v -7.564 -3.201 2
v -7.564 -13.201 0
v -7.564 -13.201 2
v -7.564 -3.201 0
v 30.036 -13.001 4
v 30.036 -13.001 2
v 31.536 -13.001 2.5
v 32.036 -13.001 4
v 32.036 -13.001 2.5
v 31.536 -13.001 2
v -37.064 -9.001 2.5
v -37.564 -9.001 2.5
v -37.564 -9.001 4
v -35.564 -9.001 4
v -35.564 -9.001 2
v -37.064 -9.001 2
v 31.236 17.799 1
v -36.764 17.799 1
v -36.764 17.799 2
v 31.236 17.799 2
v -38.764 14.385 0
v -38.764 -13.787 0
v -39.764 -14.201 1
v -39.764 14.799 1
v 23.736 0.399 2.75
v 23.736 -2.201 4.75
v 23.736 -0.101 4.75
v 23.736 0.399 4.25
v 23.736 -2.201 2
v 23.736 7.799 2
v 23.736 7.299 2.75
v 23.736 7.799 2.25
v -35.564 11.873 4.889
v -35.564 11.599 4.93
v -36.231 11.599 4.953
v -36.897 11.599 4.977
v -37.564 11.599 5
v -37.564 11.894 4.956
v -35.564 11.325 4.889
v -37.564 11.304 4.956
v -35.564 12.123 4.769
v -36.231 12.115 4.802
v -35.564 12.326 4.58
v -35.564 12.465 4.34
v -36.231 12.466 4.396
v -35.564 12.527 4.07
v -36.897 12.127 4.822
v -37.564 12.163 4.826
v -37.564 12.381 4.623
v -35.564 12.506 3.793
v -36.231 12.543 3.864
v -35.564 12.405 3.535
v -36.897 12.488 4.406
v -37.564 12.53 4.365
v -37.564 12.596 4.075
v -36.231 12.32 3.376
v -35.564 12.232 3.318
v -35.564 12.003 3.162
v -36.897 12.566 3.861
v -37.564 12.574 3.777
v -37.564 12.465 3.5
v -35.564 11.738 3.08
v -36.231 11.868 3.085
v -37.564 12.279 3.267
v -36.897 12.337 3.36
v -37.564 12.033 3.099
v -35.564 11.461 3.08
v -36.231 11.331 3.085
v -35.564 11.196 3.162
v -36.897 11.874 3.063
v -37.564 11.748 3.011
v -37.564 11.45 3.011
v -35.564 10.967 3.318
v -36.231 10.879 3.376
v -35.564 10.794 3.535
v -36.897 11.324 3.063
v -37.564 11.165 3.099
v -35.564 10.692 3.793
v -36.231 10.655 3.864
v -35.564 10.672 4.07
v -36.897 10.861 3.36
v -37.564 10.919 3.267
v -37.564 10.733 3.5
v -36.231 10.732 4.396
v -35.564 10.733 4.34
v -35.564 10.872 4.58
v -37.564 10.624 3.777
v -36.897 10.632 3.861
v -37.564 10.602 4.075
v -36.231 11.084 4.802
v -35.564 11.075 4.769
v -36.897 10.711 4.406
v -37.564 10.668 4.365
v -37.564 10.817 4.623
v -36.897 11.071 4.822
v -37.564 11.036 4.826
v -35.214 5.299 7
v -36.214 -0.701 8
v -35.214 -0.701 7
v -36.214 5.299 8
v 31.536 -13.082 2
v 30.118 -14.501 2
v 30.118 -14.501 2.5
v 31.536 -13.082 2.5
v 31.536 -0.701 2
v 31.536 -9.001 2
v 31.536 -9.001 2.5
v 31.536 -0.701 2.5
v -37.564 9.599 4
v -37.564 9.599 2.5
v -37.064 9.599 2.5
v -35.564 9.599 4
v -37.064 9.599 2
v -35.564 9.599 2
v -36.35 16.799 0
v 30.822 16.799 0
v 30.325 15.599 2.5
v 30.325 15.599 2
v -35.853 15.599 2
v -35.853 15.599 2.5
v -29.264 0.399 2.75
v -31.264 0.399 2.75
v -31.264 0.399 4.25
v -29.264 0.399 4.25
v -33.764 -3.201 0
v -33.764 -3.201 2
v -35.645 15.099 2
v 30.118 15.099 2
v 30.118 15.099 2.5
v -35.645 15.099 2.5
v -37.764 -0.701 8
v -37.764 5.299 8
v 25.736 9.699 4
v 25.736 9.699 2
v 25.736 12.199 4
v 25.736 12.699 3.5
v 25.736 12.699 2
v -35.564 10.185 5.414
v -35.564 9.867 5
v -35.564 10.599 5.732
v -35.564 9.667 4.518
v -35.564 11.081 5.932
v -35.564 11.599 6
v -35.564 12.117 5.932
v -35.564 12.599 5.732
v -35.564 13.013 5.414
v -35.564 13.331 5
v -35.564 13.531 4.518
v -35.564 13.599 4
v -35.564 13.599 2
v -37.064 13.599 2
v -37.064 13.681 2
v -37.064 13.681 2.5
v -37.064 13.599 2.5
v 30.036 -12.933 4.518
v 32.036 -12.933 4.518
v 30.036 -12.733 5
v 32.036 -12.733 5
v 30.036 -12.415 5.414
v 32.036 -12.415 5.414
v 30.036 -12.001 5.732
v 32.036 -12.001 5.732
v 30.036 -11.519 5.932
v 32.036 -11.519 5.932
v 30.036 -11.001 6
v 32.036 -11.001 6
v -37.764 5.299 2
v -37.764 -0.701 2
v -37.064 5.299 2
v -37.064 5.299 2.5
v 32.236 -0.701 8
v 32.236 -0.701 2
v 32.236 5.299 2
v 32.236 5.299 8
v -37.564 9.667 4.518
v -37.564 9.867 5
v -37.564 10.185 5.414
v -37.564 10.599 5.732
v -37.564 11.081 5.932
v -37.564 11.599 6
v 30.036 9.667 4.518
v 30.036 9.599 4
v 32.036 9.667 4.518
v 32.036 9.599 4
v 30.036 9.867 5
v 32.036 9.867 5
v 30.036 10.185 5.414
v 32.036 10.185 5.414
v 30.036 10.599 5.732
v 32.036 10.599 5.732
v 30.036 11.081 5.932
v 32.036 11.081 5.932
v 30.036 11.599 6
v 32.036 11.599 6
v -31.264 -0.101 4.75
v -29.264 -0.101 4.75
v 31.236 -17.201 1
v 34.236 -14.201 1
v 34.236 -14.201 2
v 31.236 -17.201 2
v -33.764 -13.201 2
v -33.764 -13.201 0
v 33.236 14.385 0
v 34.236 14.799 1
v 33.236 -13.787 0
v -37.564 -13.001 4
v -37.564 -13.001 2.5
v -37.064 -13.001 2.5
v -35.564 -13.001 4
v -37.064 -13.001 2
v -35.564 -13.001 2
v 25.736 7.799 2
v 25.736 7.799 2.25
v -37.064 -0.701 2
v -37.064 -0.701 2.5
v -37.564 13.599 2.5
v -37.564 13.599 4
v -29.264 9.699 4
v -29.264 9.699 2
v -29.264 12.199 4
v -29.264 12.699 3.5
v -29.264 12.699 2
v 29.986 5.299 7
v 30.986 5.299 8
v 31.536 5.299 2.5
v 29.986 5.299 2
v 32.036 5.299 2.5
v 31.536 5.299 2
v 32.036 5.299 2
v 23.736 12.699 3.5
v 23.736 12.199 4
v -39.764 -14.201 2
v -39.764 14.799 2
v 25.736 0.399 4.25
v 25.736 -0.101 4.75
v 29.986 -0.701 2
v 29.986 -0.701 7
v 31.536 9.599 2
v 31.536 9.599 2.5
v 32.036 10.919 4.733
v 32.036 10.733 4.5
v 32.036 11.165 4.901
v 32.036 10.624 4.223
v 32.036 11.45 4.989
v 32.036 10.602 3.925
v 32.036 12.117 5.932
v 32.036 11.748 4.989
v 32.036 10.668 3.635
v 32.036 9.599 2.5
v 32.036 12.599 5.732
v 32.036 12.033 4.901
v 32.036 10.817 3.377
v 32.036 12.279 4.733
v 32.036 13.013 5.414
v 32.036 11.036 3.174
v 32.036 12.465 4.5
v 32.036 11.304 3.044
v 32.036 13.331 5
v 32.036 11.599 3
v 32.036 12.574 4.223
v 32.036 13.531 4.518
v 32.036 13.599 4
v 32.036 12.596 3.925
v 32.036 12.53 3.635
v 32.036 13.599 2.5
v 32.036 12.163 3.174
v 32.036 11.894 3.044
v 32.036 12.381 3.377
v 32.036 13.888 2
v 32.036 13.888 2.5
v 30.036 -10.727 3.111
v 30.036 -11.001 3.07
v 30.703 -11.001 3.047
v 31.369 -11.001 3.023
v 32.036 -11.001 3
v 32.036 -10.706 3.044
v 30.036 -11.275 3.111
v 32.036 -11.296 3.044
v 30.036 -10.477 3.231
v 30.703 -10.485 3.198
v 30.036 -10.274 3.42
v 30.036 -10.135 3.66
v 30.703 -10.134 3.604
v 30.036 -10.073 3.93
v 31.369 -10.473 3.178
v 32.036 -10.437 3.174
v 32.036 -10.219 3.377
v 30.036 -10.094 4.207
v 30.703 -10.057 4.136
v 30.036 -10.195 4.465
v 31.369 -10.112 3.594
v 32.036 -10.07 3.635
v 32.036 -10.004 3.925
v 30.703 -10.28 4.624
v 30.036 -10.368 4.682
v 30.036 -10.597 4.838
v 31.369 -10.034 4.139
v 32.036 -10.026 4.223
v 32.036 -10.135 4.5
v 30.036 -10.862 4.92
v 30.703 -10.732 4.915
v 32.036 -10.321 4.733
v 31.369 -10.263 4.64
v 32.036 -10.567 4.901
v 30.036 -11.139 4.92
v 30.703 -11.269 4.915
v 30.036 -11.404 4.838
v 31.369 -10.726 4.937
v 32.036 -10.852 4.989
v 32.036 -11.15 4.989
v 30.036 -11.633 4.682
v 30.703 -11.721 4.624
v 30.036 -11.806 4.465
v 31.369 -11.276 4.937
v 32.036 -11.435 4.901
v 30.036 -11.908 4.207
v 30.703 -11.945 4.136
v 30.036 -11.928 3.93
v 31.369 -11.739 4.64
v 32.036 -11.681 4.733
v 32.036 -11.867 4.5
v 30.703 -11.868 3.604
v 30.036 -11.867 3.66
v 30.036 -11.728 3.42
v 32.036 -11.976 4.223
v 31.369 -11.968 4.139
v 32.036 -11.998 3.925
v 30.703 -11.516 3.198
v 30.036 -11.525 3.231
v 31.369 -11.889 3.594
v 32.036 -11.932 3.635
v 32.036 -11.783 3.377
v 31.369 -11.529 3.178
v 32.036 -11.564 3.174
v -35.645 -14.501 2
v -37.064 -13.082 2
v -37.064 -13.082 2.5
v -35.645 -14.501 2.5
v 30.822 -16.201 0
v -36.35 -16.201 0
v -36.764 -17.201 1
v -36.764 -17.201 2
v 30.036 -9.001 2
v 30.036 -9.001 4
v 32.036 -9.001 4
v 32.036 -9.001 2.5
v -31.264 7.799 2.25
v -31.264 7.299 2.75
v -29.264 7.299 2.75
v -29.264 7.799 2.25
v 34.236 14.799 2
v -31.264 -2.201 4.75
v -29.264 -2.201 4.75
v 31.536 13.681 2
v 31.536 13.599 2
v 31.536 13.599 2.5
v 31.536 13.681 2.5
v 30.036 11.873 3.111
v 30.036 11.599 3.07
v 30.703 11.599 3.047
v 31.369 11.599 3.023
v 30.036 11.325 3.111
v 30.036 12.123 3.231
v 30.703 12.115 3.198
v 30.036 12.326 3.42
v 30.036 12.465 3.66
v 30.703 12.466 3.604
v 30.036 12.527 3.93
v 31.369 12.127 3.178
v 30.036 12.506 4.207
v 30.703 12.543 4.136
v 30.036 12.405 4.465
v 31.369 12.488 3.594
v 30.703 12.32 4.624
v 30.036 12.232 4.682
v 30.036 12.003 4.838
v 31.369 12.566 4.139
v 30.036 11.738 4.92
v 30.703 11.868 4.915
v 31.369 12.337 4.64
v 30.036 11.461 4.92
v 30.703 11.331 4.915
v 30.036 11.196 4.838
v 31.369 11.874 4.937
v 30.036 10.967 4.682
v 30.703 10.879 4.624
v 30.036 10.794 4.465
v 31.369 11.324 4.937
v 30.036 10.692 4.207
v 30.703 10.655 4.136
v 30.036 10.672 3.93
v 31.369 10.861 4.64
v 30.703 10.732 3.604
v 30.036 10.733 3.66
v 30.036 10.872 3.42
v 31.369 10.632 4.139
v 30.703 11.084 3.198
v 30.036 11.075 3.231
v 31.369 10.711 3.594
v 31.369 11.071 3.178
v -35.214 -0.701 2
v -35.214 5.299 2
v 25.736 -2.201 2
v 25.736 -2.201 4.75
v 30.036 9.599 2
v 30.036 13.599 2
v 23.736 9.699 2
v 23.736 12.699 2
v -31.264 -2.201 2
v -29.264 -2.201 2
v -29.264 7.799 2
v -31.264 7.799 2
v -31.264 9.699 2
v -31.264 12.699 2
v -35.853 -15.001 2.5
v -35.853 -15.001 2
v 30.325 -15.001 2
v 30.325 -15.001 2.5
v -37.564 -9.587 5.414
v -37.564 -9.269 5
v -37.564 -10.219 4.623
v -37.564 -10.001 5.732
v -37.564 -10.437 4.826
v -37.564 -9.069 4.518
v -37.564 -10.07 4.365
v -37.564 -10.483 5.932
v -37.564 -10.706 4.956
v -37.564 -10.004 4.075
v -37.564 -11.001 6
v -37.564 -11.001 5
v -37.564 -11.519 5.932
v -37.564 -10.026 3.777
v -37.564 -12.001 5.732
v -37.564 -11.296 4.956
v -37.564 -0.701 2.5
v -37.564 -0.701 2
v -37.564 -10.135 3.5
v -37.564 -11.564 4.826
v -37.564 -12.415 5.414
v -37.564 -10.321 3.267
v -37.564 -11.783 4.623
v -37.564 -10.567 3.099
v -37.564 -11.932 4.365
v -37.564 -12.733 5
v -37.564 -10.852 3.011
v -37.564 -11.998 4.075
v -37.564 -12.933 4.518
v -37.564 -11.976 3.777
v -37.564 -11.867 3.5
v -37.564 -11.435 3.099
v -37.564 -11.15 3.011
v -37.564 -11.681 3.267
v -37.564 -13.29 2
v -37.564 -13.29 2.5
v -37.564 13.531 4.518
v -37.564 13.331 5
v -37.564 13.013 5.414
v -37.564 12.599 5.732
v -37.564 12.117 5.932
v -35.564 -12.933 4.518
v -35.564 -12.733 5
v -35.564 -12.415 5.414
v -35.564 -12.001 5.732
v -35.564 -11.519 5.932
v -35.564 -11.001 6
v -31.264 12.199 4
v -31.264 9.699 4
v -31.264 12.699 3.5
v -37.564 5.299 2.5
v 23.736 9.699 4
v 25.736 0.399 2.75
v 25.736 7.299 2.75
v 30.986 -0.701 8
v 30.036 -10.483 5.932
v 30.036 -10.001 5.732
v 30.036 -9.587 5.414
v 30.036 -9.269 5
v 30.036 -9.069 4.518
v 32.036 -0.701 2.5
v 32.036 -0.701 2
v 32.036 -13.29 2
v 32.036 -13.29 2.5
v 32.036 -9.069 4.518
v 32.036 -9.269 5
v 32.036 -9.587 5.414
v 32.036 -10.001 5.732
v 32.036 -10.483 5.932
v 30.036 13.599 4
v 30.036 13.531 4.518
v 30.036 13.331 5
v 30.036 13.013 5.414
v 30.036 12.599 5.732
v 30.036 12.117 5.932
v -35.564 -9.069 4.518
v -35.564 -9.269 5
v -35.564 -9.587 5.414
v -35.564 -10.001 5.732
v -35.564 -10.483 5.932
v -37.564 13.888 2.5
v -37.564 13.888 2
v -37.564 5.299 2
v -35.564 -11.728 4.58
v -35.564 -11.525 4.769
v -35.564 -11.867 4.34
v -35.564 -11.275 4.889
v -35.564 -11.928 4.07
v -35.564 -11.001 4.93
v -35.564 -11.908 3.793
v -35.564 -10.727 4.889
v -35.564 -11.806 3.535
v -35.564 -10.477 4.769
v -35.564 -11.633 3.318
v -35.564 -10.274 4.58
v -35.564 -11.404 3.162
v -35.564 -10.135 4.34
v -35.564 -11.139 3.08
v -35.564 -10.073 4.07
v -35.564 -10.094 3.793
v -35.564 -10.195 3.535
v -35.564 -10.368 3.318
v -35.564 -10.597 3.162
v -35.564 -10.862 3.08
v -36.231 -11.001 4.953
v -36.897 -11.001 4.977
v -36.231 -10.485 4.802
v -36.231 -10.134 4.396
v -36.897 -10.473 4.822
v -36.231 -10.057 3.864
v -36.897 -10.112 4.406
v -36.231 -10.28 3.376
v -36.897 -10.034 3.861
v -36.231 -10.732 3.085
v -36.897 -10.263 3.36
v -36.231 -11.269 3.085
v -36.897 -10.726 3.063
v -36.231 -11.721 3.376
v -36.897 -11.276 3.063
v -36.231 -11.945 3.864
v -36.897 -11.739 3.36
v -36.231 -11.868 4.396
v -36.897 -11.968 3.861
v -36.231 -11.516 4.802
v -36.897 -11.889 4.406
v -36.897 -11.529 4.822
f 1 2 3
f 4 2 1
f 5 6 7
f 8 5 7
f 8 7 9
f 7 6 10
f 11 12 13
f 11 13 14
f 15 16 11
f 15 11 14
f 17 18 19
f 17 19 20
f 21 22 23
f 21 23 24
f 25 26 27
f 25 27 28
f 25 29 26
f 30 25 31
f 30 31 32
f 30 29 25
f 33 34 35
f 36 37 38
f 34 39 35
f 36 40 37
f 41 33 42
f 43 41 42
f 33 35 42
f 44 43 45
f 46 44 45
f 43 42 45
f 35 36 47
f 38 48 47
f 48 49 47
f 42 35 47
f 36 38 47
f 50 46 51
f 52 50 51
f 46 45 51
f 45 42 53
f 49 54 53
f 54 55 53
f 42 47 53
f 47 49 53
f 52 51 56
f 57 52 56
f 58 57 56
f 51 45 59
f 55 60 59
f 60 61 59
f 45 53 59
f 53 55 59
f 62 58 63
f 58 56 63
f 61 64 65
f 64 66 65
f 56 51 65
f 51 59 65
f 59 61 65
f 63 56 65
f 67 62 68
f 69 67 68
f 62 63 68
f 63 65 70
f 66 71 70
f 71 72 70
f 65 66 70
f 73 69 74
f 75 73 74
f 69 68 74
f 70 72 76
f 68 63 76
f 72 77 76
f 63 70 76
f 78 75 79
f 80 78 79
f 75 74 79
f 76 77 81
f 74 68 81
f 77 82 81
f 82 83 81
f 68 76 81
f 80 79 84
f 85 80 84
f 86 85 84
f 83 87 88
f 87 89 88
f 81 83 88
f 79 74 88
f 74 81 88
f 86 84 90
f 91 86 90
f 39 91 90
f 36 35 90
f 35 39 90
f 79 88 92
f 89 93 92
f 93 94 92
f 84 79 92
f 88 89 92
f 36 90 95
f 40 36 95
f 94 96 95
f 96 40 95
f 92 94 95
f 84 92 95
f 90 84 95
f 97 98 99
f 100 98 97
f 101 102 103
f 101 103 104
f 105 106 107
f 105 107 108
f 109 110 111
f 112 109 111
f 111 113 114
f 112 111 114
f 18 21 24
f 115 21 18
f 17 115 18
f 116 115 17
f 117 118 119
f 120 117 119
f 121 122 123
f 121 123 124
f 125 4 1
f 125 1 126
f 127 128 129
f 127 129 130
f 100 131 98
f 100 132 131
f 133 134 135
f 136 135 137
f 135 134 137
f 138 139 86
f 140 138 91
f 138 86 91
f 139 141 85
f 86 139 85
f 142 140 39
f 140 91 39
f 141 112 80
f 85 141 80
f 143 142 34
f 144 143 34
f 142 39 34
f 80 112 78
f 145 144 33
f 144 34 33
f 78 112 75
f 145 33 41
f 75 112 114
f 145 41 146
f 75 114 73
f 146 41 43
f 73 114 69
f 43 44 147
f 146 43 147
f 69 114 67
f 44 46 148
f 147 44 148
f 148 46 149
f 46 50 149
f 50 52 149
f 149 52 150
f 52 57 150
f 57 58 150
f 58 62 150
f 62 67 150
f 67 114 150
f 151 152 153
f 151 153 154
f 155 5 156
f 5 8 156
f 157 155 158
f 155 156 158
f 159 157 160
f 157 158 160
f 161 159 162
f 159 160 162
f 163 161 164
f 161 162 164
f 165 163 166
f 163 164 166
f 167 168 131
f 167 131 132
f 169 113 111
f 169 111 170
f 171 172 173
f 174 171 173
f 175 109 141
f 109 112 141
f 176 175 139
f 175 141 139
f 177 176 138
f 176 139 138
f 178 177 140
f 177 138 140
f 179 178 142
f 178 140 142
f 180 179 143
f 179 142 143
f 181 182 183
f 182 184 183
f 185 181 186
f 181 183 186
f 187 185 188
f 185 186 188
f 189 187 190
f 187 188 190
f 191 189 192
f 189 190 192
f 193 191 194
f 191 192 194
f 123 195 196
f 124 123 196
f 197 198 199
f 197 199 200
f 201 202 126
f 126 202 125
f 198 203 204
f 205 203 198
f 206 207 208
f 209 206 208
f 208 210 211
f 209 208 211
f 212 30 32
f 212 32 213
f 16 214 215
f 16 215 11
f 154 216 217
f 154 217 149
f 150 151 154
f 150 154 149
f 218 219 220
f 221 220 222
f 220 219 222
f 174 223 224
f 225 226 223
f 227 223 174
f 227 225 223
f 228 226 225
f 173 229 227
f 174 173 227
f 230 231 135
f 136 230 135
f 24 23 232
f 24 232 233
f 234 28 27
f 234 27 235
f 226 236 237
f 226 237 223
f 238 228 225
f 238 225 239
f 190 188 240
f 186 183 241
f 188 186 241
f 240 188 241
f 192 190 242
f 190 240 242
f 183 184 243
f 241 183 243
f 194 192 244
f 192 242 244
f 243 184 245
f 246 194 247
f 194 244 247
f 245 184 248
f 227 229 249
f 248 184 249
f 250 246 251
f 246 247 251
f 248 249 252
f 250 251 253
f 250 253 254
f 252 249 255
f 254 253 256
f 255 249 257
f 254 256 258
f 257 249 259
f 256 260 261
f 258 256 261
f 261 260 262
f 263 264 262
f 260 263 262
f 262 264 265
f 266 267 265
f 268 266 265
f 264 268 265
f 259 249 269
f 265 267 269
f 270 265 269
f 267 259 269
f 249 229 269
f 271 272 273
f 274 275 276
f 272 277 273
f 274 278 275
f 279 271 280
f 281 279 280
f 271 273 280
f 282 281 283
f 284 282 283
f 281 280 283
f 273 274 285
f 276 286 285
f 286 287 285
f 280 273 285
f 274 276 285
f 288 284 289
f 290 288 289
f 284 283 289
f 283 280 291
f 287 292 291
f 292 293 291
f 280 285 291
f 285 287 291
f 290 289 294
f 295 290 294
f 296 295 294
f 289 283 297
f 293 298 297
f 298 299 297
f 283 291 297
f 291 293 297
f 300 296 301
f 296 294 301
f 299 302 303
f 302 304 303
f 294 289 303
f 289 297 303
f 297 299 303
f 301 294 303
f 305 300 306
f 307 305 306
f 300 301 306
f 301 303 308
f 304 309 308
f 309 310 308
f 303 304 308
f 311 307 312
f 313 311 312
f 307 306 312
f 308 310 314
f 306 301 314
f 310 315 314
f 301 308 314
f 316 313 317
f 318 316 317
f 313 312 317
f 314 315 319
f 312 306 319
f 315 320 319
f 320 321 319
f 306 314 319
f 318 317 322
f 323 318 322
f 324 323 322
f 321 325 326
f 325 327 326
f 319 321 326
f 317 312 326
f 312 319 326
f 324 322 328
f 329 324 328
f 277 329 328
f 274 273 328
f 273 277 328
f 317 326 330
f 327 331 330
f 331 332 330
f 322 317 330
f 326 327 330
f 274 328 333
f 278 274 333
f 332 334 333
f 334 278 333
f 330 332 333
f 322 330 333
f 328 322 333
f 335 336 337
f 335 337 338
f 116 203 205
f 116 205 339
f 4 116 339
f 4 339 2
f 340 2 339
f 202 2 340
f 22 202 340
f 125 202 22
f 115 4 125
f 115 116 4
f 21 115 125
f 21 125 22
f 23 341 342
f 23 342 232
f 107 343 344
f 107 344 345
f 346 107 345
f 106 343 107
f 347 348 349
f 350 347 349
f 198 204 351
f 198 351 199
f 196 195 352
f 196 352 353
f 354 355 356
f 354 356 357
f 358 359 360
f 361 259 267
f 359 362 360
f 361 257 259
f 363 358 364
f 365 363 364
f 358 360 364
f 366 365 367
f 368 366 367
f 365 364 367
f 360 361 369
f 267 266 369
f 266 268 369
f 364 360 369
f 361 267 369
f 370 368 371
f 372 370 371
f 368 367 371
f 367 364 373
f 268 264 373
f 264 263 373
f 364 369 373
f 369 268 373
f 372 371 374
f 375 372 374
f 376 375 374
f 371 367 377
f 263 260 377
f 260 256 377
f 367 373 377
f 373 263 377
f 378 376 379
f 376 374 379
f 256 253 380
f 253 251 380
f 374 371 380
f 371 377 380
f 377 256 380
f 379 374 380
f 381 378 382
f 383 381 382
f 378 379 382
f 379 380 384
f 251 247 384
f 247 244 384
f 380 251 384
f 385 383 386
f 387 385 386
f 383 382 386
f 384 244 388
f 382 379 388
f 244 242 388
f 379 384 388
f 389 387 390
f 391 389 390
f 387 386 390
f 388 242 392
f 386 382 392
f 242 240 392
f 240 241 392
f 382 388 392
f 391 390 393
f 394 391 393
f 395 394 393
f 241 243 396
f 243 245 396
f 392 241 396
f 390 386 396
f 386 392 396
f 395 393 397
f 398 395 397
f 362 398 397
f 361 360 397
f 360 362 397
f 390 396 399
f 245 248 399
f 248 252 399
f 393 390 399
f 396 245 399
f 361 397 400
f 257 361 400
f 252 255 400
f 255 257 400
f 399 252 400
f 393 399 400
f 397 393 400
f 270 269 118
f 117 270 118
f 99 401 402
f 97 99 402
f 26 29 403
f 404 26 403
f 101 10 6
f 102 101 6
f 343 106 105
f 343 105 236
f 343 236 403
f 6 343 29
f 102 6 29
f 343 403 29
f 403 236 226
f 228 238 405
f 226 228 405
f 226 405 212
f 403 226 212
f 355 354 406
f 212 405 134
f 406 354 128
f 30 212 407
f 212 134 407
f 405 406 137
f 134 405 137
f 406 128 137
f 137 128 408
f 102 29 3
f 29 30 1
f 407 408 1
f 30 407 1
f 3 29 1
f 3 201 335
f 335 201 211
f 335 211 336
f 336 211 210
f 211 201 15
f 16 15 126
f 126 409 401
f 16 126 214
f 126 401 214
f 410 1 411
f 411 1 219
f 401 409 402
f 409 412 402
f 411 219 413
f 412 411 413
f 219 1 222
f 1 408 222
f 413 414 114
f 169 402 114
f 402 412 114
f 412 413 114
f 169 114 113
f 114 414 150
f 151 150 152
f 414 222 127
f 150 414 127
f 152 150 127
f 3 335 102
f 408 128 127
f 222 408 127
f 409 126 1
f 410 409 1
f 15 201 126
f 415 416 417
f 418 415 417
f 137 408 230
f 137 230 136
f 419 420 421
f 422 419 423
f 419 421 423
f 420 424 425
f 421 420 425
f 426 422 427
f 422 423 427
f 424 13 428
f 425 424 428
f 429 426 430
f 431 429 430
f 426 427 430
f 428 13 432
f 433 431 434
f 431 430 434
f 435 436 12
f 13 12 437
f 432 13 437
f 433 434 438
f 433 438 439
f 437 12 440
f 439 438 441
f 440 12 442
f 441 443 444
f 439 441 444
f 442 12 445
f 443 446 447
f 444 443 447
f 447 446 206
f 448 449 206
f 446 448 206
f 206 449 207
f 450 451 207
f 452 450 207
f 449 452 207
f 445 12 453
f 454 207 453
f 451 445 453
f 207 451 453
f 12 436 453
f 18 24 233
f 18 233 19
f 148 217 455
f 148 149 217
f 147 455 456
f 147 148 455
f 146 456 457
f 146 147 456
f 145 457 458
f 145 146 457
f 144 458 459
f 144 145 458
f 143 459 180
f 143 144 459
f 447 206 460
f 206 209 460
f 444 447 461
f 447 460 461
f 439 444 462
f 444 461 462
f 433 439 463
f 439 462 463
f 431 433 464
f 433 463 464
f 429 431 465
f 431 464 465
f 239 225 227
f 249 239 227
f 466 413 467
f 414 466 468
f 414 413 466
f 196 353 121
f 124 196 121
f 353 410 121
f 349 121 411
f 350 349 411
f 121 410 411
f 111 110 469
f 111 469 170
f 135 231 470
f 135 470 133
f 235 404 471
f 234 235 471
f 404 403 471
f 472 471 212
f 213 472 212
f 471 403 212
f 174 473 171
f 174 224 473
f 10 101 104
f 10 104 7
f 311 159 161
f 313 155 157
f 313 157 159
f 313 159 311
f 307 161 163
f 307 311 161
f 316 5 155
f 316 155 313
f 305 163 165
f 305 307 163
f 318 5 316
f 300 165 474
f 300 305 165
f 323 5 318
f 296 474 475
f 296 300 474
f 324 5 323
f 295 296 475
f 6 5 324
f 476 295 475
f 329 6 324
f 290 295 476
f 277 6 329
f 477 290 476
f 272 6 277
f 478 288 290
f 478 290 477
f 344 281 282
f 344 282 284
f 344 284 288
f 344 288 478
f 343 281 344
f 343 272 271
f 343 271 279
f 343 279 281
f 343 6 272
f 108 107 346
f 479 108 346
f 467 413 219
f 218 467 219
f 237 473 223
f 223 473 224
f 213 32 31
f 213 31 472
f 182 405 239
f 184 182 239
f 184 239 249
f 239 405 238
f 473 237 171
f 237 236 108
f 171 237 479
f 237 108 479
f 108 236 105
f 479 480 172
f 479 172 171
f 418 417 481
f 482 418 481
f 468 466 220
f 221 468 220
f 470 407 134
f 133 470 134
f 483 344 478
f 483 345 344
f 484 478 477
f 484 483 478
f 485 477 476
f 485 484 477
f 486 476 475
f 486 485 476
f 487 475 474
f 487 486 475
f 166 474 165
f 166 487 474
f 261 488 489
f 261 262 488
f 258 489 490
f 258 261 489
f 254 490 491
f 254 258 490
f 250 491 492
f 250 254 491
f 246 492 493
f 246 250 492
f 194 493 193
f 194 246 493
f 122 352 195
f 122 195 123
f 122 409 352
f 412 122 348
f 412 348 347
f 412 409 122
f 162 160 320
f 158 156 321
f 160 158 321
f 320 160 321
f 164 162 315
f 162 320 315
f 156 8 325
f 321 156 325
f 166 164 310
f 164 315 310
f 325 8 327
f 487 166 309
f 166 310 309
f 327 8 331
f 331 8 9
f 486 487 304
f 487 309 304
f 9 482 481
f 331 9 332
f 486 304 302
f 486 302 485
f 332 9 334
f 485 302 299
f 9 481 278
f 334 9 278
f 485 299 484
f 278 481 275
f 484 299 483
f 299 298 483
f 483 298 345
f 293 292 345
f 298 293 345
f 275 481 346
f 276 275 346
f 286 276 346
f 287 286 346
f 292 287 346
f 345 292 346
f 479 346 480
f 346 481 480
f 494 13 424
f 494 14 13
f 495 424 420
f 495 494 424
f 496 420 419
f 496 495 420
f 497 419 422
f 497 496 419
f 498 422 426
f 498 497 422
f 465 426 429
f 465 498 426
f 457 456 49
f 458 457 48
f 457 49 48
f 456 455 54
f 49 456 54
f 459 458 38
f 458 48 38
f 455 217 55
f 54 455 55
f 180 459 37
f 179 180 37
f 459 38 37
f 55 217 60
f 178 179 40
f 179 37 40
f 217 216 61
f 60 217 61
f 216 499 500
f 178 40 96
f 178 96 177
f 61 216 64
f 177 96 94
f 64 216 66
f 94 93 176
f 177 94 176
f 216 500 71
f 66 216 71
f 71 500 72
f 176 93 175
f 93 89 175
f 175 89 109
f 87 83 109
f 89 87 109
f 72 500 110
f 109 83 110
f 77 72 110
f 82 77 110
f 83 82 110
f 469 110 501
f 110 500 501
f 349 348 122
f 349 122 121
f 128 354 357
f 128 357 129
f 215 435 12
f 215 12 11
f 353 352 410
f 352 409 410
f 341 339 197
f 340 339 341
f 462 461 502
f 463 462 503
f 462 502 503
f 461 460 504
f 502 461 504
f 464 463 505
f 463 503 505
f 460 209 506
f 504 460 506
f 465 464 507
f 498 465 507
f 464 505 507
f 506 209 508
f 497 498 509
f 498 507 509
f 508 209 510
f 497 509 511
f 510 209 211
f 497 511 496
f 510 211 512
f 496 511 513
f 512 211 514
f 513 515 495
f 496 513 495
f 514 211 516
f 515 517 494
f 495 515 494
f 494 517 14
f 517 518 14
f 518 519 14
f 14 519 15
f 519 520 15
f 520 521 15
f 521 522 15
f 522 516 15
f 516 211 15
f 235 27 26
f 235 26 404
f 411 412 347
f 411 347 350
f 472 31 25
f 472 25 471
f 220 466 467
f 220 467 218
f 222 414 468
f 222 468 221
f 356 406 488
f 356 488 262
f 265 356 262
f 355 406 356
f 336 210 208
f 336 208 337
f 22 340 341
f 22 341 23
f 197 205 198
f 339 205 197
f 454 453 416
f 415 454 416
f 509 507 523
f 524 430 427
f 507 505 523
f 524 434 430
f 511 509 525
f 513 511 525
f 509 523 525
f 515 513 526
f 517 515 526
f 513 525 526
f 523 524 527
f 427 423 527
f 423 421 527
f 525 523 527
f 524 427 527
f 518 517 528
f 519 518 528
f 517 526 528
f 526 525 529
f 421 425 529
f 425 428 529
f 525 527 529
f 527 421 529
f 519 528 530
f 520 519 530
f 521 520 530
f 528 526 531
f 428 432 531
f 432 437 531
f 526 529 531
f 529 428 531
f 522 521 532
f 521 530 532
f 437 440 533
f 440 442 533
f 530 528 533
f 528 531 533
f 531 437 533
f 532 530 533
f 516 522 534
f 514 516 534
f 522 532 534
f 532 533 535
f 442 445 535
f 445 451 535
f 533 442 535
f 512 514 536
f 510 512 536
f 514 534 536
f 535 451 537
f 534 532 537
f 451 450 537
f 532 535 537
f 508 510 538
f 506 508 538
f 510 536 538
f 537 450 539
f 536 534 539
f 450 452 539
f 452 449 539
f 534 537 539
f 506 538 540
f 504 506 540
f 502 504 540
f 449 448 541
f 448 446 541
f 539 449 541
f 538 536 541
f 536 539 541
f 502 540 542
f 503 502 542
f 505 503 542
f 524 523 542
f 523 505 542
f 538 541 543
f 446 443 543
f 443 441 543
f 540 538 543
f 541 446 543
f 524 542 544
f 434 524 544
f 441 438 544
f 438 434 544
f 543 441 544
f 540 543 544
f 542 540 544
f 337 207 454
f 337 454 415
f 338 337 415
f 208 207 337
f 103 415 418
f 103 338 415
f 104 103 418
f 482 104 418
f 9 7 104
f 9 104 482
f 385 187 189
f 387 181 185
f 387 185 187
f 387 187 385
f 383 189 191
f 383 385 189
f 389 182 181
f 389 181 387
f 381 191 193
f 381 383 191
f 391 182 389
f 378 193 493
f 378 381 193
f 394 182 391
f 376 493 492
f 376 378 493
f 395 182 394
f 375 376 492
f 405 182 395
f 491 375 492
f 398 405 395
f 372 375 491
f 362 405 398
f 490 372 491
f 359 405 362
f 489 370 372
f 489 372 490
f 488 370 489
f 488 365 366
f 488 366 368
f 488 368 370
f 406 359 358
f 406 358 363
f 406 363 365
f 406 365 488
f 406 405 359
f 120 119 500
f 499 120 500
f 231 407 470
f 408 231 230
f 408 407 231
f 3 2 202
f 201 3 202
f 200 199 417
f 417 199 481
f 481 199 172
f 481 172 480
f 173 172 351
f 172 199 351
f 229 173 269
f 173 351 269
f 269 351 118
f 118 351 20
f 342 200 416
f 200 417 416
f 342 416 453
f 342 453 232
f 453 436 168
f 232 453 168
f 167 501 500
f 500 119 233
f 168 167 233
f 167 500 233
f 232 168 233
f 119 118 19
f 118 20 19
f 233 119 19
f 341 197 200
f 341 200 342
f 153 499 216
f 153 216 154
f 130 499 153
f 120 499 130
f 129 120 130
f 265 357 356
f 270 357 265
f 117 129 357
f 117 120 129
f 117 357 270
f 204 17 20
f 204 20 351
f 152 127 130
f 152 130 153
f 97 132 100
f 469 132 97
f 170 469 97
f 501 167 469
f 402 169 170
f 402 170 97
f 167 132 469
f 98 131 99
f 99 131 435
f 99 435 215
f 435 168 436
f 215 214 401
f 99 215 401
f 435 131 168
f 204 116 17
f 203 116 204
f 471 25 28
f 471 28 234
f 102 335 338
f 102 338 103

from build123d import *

# Parameters (mm, degrees)
EXTRUDE_1_DEPTH               = 2
CHAMFER_1_SIZE                = 1
SKETCH_3_W                    = 2
SKETCH_3_H                    = 4
EXTRUDE_2_DEPTH               = 4
FILLET_1_R                    = 2
SKETCH_4_R                    = 1
CUT_EXTRUDE_1_DEPTH           = 2
CUT_EXTRUDE_1_DRAFT           = -2
CUT_EXTRUDE_1_PROFILE_2_DEPTH = 2
CUT_EXTRUDE_1_PROFILE_2_DRAFT = -2
SKETCH_5_R                    = 1
CUT_EXTRUDE_2_DEPTH           = 2
CUT_EXTRUDE_2_DRAFT           = -2
CUT_EXTRUDE_2_PROFILE_2_DEPTH = 2
CUT_EXTRUDE_2_PROFILE_2_DRAFT = -2
SKETCH_6_W                    = 2
SKETCH_6_H                    = 10
EXTRUDE_3_DEPTH               = 0.75
SKETCH_7_W                    = 2
SKETCH_7_H                    = 2.6
EXTRUDE_4_DEPTH               = 2
CHAMFER_2_SIZE                = 0.5
SKETCH_8_W                    = 2.55
SKETCH_8_H                    = 6
SKETCH_8_W_2                  = 2.25
EXTRUDE_5_DEPTH               = 6
CHAMFER_3_SIZE                = 1
SKETCH_9_W                    = 2
SKETCH_9_H                    = 3
EXTRUDE_6_DEPTH               = 2
CHAMFER_4_SIZE                = 0.5
CUT_EXTRUDE_3_REACH           = 46.294
SKETCH_10_W                   = 26.2
SKETCH_10_H                   = 10
EXTRUDE_7_DEPTH               = 0.5


with BuildPart() as part:
    # 草图1 → 凸台-拉伸1 (new body)
    with BuildSketch(Plane.XY):
        Polygon((-39.76383505, 14.799206062), (-36.76383505, 17.799206062), (31.23616495, 17.799206062), (34.23616495, 14.799206062), (34.23616495, -14.200793938), (31.23616495, -17.200793938), (-36.76383505, -17.200793938), (-39.76383505, -14.200793938), align=None)
    extrude(amount=EXTRUDE_1_DEPTH)

    # 倒角1
    chamfer_1_edges = [part.edges().sort_by_distance(p)[0] for p in [
        (-38.26383505, -15.700793938, 0),
        (-39.76383505, 0.299206062, 0),
        (-38.26383505, 16.299206062, 0),
        (-2.76383505, 17.799206062, 0),
        (32.73616495, 16.299206062, 0),
        (34.23616495, 0.299206062, 0),
        (32.73616495, -15.700793938, 0),
        (-2.76383505, -17.200793938, 0),
    ]]
    chamfer(chamfer_1_edges, length=CHAMFER_1_SIZE)

    # 草图3 → 凸台-拉伸2 (add)
    with BuildSketch(Plane.XY.offset(2)):
        with Locations((-36.56383505, 11.599206062)):
            Rectangle(SKETCH_3_W, SKETCH_3_H)
        with Locations((-36.56383505, -11.000793938)):
            Rectangle(SKETCH_3_W, SKETCH_3_H)
        with Locations((31.03616495, 11.599206062)):
            Rectangle(SKETCH_3_W, SKETCH_3_H)
        with Locations((31.03616495, -11.000793938)):
            Rectangle(SKETCH_3_W, SKETCH_3_H)
    extrude(amount=EXTRUDE_2_DEPTH)

    # 圆角1
    fillet_1_edges = [part.edges().sort_by_distance(p)[0] for p in [
        (31.03616495, 13.599206062, 6),
        (31.03616495, 9.599206062, 6),
        (31.03616495, -9.000793938, 6),
        (31.03616495, -13.000793938, 6),
        (-36.56383505, -13.000793938, 6),
        (-36.56383505, -9.000793938, 6),
        (-36.56383505, 13.599206062, 6),
        (-36.56383505, 9.599206062, 6),
    ]]
    fillet(fillet_1_edges, radius=FILLET_1_R - 0.0001)  # a hair under: the kernel refuses the full size


with BuildPart() as cut_extrude_1_tool:
    # 草图4 → 切除-拉伸1 (with draft: the straight prism first)
    with BuildSketch(Plane(origin=(32.03616495, 0, 0), x_dir=(0, 0, -1), z_dir=(1, 0, 0))):
        with Locations((-4, 11.599206062)):
            Circle(SKETCH_4_R)
    extrude(amount=-CUT_EXTRUDE_1_DEPTH)
    # 切除-拉伸1: the draft: its side faces are tilted about the plane it starts from
    cut_extrude_1_sides = [cut_extrude_1_tool.faces().sort_by_distance(p)[0] for p in [
        (31.03616495, 11.599206062, 5),
    ]]
    draft(cut_extrude_1_sides, Plane(origin=(32.03616495, 0, 0), x_dir=(0, 0, -1), z_dir=(1, 0, 0)), CUT_EXTRUDE_1_DRAFT)


with BuildPart() as part_1:
    add(part.part)

    # 切除-拉伸1: cut by cut_extrude_1_tool
    add(cut_extrude_1_tool.part, mode=Mode.SUBTRACT)


with BuildPart() as cut_extrude_1_profile_2_tool:
    # 草图4 → 切除-拉伸1 profile 2 (with draft: the straight prism first)
    with BuildSketch(Plane(origin=(32.03616495, 0, 0), x_dir=(0, 0, -1), z_dir=(1, 0, 0))):
        with Locations((-4, -11.000793938)):
            Circle(SKETCH_4_R)
    extrude(amount=-CUT_EXTRUDE_1_PROFILE_2_DEPTH)
    # 切除-拉伸1 profile 2: the draft: its side faces are tilted about the plane it starts from
    cut_extrude_1_profile_2_sides = [cut_extrude_1_profile_2_tool.faces().sort_by_distance(p)[0] for p in [
        (31.03616495, -11.000793938, 5),
    ]]
    draft(cut_extrude_1_profile_2_sides, Plane(origin=(32.03616495, 0, 0), x_dir=(0, 0, -1), z_dir=(1, 0, 0)), CUT_EXTRUDE_1_PROFILE_2_DRAFT)


with BuildPart() as part_2:
    add(part_1.part)

    # 切除-拉伸1 profile 2: cut by cut_extrude_1_profile_2_tool
    add(cut_extrude_1_profile_2_tool.part, mode=Mode.SUBTRACT)


with BuildPart() as cut_extrude_2_tool:
    # 草图5 → 切除-拉伸2 (with draft: the straight prism first)
    with BuildSketch(Plane.ZY.offset(37.56383505)):
        with Locations((4, 11.599206062)):
            Circle(SKETCH_5_R)
    extrude(amount=-CUT_EXTRUDE_2_DEPTH)
    # 切除-拉伸2: the draft: its side faces are tilted about the plane it starts from
    cut_extrude_2_sides = [cut_extrude_2_tool.faces().sort_by_distance(p)[0] for p in [
        (-36.56383505, 11.599206062, 3),
    ]]
    draft(cut_extrude_2_sides, Plane.ZY.offset(37.56383505), CUT_EXTRUDE_2_DRAFT)


with BuildPart() as part_3:
    add(part_2.part)

    # 切除-拉伸2: cut by cut_extrude_2_tool
    add(cut_extrude_2_tool.part, mode=Mode.SUBTRACT)


with BuildPart() as cut_extrude_2_profile_2_tool:
    # 草图5 → 切除-拉伸2 profile 2 (with draft: the straight prism first)
    with BuildSketch(Plane.ZY.offset(37.56383505)):
        with Locations((4, -11.000793938)):
            Circle(SKETCH_5_R)
    extrude(amount=-CUT_EXTRUDE_2_PROFILE_2_DEPTH)
    # 切除-拉伸2 profile 2: the draft: its side faces are tilted about the plane it starts from
    cut_extrude_2_profile_2_sides = [cut_extrude_2_profile_2_tool.faces().sort_by_distance(p)[0] for p in [
        (-36.56383505, -11.000793938, 3),
    ]]
    draft(cut_extrude_2_profile_2_sides, Plane.ZY.offset(37.56383505), CUT_EXTRUDE_2_PROFILE_2_DRAFT)


with BuildPart() as part_4:
    add(part_3.part)

    # 切除-拉伸2 profile 2: cut by cut_extrude_2_profile_2_tool
    add(cut_extrude_2_profile_2_tool.part, mode=Mode.SUBTRACT)

    # 草图6 → 凸台-拉伸3 (add)
    with BuildSketch(Plane.XY.offset(2)):
        with Locations((-30.26383505, 2.799206062)):
            Rectangle(SKETCH_6_W, SKETCH_6_H)
        with Locations((24.73616495, 2.799206062)):
            Rectangle(SKETCH_6_W, SKETCH_6_H)
    extrude(amount=EXTRUDE_3_DEPTH)

    # 草图7 → 凸台-拉伸4 (add)
    with BuildSketch(Plane.XY.offset(2.75)):
        with Locations((-30.26383505, -0.900793938)):
            Rectangle(SKETCH_7_W, SKETCH_7_H)
        with Locations((24.73616495, -0.900793938)):
            Rectangle(SKETCH_7_W, SKETCH_7_H)
    extrude(amount=EXTRUDE_4_DEPTH)

    # 倒角2
    chamfer_2_edges = [part_4.edges().sort_by_distance(p)[0] for p in [
        (-30.26383505, 7.799206062, 2.75),
        (24.73616495, 7.799206062, 2.75),
        (-30.26383505, 0.399206062, 4.75),
        (24.73616495, 0.399206062, 4.75),
    ]]
    chamfer(chamfer_2_edges, length=CHAMFER_2_SIZE)

    # 草图8 → 凸台-拉伸5 (add)
    with BuildSketch(Plane.XY.offset(2)):
        with Locations((-36.48883505, 2.299206062)):
            Rectangle(SKETCH_8_W, SKETCH_8_H)
        with Locations((31.11116495, 2.299206062)):
            Rectangle(SKETCH_8_W_2, SKETCH_8_H)
    extrude(amount=EXTRUDE_5_DEPTH)

    # 倒角3
    chamfer_3_edges = [part_4.edges().sort_by_distance(p)[0] for p in [
        (-35.21383505, 2.299206062, 8),
        (29.98616495, 2.299206062, 8),
    ]]
    chamfer(chamfer_3_edges, length=CHAMFER_3_SIZE)

    # 草图9 → 凸台-拉伸6 (add)
    with BuildSketch(Plane.XY.offset(2)):
        with Locations((-30.26383505, 11.199206062)):
            Rectangle(SKETCH_9_W, SKETCH_9_H)
        with Locations((24.73616495, 11.199206062)):
            Rectangle(SKETCH_9_W, SKETCH_9_H)
    extrude(amount=EXTRUDE_6_DEPTH)

    # 倒角4
    chamfer_4_edges = [part_4.edges().sort_by_distance(p)[0] for p in [
        (-30.26383505, 12.699206062, 4),
        (24.73616495, 12.699206062, 4),
    ]]
    chamfer(chamfer_4_edges, length=CHAMFER_4_SIZE)

    # 草图10 → 切除-拉伸3 (cut, up to next)
    with BuildSketch(Plane(origin=(0, 0, 0), x_dir=(-1, 0, 0), z_dir=(0, 0, -1)), mode=Mode.PRIVATE) as cut_extrude_3_sk1:
        with Locations((20.66383505, -8.200793938)):
            Rectangle(SKETCH_10_W, SKETCH_10_H)
    cut_extrude_3_tool1 = extrude(cut_extrude_3_sk1.sketch, amount=-CUT_EXTRUDE_3_REACH, mode=Mode.PRIVATE) & part_4.part
    add(cut_extrude_3_tool1.solids().sort_by_distance((-20.663835, -8.200794, 0))[0], mode=Mode.SUBTRACT)

    # 草图11 → 凸台-拉伸7 (add)
    with BuildSketch(Plane.XY.offset(2)):
        Polygon((30.324895113, 15.599206062), (-35.852565213, 15.599206062), (-37.56383505, 13.887936224), (-37.56383505, -13.289524101), (-35.852565213, -15.000793938), (30.324895113, -15.000793938), (32.03616495, -13.289524101), (32.03616495, 13.887936224), align=None)
        Polygon((30.117788331, 15.099206062), (-35.645458432, 15.099206062), (-37.06383505, 13.680829443), (-37.06383505, -13.08241732), (-35.645458432, -14.500793938), (30.117788331, -14.500793938), (31.53616495, -13.08241732), (31.53616495, 13.680829443), align=None, mode=Mode.SUBTRACT)
    extrude(amount=EXTRUDE_7_DEPTH)


solid = part_4.part
